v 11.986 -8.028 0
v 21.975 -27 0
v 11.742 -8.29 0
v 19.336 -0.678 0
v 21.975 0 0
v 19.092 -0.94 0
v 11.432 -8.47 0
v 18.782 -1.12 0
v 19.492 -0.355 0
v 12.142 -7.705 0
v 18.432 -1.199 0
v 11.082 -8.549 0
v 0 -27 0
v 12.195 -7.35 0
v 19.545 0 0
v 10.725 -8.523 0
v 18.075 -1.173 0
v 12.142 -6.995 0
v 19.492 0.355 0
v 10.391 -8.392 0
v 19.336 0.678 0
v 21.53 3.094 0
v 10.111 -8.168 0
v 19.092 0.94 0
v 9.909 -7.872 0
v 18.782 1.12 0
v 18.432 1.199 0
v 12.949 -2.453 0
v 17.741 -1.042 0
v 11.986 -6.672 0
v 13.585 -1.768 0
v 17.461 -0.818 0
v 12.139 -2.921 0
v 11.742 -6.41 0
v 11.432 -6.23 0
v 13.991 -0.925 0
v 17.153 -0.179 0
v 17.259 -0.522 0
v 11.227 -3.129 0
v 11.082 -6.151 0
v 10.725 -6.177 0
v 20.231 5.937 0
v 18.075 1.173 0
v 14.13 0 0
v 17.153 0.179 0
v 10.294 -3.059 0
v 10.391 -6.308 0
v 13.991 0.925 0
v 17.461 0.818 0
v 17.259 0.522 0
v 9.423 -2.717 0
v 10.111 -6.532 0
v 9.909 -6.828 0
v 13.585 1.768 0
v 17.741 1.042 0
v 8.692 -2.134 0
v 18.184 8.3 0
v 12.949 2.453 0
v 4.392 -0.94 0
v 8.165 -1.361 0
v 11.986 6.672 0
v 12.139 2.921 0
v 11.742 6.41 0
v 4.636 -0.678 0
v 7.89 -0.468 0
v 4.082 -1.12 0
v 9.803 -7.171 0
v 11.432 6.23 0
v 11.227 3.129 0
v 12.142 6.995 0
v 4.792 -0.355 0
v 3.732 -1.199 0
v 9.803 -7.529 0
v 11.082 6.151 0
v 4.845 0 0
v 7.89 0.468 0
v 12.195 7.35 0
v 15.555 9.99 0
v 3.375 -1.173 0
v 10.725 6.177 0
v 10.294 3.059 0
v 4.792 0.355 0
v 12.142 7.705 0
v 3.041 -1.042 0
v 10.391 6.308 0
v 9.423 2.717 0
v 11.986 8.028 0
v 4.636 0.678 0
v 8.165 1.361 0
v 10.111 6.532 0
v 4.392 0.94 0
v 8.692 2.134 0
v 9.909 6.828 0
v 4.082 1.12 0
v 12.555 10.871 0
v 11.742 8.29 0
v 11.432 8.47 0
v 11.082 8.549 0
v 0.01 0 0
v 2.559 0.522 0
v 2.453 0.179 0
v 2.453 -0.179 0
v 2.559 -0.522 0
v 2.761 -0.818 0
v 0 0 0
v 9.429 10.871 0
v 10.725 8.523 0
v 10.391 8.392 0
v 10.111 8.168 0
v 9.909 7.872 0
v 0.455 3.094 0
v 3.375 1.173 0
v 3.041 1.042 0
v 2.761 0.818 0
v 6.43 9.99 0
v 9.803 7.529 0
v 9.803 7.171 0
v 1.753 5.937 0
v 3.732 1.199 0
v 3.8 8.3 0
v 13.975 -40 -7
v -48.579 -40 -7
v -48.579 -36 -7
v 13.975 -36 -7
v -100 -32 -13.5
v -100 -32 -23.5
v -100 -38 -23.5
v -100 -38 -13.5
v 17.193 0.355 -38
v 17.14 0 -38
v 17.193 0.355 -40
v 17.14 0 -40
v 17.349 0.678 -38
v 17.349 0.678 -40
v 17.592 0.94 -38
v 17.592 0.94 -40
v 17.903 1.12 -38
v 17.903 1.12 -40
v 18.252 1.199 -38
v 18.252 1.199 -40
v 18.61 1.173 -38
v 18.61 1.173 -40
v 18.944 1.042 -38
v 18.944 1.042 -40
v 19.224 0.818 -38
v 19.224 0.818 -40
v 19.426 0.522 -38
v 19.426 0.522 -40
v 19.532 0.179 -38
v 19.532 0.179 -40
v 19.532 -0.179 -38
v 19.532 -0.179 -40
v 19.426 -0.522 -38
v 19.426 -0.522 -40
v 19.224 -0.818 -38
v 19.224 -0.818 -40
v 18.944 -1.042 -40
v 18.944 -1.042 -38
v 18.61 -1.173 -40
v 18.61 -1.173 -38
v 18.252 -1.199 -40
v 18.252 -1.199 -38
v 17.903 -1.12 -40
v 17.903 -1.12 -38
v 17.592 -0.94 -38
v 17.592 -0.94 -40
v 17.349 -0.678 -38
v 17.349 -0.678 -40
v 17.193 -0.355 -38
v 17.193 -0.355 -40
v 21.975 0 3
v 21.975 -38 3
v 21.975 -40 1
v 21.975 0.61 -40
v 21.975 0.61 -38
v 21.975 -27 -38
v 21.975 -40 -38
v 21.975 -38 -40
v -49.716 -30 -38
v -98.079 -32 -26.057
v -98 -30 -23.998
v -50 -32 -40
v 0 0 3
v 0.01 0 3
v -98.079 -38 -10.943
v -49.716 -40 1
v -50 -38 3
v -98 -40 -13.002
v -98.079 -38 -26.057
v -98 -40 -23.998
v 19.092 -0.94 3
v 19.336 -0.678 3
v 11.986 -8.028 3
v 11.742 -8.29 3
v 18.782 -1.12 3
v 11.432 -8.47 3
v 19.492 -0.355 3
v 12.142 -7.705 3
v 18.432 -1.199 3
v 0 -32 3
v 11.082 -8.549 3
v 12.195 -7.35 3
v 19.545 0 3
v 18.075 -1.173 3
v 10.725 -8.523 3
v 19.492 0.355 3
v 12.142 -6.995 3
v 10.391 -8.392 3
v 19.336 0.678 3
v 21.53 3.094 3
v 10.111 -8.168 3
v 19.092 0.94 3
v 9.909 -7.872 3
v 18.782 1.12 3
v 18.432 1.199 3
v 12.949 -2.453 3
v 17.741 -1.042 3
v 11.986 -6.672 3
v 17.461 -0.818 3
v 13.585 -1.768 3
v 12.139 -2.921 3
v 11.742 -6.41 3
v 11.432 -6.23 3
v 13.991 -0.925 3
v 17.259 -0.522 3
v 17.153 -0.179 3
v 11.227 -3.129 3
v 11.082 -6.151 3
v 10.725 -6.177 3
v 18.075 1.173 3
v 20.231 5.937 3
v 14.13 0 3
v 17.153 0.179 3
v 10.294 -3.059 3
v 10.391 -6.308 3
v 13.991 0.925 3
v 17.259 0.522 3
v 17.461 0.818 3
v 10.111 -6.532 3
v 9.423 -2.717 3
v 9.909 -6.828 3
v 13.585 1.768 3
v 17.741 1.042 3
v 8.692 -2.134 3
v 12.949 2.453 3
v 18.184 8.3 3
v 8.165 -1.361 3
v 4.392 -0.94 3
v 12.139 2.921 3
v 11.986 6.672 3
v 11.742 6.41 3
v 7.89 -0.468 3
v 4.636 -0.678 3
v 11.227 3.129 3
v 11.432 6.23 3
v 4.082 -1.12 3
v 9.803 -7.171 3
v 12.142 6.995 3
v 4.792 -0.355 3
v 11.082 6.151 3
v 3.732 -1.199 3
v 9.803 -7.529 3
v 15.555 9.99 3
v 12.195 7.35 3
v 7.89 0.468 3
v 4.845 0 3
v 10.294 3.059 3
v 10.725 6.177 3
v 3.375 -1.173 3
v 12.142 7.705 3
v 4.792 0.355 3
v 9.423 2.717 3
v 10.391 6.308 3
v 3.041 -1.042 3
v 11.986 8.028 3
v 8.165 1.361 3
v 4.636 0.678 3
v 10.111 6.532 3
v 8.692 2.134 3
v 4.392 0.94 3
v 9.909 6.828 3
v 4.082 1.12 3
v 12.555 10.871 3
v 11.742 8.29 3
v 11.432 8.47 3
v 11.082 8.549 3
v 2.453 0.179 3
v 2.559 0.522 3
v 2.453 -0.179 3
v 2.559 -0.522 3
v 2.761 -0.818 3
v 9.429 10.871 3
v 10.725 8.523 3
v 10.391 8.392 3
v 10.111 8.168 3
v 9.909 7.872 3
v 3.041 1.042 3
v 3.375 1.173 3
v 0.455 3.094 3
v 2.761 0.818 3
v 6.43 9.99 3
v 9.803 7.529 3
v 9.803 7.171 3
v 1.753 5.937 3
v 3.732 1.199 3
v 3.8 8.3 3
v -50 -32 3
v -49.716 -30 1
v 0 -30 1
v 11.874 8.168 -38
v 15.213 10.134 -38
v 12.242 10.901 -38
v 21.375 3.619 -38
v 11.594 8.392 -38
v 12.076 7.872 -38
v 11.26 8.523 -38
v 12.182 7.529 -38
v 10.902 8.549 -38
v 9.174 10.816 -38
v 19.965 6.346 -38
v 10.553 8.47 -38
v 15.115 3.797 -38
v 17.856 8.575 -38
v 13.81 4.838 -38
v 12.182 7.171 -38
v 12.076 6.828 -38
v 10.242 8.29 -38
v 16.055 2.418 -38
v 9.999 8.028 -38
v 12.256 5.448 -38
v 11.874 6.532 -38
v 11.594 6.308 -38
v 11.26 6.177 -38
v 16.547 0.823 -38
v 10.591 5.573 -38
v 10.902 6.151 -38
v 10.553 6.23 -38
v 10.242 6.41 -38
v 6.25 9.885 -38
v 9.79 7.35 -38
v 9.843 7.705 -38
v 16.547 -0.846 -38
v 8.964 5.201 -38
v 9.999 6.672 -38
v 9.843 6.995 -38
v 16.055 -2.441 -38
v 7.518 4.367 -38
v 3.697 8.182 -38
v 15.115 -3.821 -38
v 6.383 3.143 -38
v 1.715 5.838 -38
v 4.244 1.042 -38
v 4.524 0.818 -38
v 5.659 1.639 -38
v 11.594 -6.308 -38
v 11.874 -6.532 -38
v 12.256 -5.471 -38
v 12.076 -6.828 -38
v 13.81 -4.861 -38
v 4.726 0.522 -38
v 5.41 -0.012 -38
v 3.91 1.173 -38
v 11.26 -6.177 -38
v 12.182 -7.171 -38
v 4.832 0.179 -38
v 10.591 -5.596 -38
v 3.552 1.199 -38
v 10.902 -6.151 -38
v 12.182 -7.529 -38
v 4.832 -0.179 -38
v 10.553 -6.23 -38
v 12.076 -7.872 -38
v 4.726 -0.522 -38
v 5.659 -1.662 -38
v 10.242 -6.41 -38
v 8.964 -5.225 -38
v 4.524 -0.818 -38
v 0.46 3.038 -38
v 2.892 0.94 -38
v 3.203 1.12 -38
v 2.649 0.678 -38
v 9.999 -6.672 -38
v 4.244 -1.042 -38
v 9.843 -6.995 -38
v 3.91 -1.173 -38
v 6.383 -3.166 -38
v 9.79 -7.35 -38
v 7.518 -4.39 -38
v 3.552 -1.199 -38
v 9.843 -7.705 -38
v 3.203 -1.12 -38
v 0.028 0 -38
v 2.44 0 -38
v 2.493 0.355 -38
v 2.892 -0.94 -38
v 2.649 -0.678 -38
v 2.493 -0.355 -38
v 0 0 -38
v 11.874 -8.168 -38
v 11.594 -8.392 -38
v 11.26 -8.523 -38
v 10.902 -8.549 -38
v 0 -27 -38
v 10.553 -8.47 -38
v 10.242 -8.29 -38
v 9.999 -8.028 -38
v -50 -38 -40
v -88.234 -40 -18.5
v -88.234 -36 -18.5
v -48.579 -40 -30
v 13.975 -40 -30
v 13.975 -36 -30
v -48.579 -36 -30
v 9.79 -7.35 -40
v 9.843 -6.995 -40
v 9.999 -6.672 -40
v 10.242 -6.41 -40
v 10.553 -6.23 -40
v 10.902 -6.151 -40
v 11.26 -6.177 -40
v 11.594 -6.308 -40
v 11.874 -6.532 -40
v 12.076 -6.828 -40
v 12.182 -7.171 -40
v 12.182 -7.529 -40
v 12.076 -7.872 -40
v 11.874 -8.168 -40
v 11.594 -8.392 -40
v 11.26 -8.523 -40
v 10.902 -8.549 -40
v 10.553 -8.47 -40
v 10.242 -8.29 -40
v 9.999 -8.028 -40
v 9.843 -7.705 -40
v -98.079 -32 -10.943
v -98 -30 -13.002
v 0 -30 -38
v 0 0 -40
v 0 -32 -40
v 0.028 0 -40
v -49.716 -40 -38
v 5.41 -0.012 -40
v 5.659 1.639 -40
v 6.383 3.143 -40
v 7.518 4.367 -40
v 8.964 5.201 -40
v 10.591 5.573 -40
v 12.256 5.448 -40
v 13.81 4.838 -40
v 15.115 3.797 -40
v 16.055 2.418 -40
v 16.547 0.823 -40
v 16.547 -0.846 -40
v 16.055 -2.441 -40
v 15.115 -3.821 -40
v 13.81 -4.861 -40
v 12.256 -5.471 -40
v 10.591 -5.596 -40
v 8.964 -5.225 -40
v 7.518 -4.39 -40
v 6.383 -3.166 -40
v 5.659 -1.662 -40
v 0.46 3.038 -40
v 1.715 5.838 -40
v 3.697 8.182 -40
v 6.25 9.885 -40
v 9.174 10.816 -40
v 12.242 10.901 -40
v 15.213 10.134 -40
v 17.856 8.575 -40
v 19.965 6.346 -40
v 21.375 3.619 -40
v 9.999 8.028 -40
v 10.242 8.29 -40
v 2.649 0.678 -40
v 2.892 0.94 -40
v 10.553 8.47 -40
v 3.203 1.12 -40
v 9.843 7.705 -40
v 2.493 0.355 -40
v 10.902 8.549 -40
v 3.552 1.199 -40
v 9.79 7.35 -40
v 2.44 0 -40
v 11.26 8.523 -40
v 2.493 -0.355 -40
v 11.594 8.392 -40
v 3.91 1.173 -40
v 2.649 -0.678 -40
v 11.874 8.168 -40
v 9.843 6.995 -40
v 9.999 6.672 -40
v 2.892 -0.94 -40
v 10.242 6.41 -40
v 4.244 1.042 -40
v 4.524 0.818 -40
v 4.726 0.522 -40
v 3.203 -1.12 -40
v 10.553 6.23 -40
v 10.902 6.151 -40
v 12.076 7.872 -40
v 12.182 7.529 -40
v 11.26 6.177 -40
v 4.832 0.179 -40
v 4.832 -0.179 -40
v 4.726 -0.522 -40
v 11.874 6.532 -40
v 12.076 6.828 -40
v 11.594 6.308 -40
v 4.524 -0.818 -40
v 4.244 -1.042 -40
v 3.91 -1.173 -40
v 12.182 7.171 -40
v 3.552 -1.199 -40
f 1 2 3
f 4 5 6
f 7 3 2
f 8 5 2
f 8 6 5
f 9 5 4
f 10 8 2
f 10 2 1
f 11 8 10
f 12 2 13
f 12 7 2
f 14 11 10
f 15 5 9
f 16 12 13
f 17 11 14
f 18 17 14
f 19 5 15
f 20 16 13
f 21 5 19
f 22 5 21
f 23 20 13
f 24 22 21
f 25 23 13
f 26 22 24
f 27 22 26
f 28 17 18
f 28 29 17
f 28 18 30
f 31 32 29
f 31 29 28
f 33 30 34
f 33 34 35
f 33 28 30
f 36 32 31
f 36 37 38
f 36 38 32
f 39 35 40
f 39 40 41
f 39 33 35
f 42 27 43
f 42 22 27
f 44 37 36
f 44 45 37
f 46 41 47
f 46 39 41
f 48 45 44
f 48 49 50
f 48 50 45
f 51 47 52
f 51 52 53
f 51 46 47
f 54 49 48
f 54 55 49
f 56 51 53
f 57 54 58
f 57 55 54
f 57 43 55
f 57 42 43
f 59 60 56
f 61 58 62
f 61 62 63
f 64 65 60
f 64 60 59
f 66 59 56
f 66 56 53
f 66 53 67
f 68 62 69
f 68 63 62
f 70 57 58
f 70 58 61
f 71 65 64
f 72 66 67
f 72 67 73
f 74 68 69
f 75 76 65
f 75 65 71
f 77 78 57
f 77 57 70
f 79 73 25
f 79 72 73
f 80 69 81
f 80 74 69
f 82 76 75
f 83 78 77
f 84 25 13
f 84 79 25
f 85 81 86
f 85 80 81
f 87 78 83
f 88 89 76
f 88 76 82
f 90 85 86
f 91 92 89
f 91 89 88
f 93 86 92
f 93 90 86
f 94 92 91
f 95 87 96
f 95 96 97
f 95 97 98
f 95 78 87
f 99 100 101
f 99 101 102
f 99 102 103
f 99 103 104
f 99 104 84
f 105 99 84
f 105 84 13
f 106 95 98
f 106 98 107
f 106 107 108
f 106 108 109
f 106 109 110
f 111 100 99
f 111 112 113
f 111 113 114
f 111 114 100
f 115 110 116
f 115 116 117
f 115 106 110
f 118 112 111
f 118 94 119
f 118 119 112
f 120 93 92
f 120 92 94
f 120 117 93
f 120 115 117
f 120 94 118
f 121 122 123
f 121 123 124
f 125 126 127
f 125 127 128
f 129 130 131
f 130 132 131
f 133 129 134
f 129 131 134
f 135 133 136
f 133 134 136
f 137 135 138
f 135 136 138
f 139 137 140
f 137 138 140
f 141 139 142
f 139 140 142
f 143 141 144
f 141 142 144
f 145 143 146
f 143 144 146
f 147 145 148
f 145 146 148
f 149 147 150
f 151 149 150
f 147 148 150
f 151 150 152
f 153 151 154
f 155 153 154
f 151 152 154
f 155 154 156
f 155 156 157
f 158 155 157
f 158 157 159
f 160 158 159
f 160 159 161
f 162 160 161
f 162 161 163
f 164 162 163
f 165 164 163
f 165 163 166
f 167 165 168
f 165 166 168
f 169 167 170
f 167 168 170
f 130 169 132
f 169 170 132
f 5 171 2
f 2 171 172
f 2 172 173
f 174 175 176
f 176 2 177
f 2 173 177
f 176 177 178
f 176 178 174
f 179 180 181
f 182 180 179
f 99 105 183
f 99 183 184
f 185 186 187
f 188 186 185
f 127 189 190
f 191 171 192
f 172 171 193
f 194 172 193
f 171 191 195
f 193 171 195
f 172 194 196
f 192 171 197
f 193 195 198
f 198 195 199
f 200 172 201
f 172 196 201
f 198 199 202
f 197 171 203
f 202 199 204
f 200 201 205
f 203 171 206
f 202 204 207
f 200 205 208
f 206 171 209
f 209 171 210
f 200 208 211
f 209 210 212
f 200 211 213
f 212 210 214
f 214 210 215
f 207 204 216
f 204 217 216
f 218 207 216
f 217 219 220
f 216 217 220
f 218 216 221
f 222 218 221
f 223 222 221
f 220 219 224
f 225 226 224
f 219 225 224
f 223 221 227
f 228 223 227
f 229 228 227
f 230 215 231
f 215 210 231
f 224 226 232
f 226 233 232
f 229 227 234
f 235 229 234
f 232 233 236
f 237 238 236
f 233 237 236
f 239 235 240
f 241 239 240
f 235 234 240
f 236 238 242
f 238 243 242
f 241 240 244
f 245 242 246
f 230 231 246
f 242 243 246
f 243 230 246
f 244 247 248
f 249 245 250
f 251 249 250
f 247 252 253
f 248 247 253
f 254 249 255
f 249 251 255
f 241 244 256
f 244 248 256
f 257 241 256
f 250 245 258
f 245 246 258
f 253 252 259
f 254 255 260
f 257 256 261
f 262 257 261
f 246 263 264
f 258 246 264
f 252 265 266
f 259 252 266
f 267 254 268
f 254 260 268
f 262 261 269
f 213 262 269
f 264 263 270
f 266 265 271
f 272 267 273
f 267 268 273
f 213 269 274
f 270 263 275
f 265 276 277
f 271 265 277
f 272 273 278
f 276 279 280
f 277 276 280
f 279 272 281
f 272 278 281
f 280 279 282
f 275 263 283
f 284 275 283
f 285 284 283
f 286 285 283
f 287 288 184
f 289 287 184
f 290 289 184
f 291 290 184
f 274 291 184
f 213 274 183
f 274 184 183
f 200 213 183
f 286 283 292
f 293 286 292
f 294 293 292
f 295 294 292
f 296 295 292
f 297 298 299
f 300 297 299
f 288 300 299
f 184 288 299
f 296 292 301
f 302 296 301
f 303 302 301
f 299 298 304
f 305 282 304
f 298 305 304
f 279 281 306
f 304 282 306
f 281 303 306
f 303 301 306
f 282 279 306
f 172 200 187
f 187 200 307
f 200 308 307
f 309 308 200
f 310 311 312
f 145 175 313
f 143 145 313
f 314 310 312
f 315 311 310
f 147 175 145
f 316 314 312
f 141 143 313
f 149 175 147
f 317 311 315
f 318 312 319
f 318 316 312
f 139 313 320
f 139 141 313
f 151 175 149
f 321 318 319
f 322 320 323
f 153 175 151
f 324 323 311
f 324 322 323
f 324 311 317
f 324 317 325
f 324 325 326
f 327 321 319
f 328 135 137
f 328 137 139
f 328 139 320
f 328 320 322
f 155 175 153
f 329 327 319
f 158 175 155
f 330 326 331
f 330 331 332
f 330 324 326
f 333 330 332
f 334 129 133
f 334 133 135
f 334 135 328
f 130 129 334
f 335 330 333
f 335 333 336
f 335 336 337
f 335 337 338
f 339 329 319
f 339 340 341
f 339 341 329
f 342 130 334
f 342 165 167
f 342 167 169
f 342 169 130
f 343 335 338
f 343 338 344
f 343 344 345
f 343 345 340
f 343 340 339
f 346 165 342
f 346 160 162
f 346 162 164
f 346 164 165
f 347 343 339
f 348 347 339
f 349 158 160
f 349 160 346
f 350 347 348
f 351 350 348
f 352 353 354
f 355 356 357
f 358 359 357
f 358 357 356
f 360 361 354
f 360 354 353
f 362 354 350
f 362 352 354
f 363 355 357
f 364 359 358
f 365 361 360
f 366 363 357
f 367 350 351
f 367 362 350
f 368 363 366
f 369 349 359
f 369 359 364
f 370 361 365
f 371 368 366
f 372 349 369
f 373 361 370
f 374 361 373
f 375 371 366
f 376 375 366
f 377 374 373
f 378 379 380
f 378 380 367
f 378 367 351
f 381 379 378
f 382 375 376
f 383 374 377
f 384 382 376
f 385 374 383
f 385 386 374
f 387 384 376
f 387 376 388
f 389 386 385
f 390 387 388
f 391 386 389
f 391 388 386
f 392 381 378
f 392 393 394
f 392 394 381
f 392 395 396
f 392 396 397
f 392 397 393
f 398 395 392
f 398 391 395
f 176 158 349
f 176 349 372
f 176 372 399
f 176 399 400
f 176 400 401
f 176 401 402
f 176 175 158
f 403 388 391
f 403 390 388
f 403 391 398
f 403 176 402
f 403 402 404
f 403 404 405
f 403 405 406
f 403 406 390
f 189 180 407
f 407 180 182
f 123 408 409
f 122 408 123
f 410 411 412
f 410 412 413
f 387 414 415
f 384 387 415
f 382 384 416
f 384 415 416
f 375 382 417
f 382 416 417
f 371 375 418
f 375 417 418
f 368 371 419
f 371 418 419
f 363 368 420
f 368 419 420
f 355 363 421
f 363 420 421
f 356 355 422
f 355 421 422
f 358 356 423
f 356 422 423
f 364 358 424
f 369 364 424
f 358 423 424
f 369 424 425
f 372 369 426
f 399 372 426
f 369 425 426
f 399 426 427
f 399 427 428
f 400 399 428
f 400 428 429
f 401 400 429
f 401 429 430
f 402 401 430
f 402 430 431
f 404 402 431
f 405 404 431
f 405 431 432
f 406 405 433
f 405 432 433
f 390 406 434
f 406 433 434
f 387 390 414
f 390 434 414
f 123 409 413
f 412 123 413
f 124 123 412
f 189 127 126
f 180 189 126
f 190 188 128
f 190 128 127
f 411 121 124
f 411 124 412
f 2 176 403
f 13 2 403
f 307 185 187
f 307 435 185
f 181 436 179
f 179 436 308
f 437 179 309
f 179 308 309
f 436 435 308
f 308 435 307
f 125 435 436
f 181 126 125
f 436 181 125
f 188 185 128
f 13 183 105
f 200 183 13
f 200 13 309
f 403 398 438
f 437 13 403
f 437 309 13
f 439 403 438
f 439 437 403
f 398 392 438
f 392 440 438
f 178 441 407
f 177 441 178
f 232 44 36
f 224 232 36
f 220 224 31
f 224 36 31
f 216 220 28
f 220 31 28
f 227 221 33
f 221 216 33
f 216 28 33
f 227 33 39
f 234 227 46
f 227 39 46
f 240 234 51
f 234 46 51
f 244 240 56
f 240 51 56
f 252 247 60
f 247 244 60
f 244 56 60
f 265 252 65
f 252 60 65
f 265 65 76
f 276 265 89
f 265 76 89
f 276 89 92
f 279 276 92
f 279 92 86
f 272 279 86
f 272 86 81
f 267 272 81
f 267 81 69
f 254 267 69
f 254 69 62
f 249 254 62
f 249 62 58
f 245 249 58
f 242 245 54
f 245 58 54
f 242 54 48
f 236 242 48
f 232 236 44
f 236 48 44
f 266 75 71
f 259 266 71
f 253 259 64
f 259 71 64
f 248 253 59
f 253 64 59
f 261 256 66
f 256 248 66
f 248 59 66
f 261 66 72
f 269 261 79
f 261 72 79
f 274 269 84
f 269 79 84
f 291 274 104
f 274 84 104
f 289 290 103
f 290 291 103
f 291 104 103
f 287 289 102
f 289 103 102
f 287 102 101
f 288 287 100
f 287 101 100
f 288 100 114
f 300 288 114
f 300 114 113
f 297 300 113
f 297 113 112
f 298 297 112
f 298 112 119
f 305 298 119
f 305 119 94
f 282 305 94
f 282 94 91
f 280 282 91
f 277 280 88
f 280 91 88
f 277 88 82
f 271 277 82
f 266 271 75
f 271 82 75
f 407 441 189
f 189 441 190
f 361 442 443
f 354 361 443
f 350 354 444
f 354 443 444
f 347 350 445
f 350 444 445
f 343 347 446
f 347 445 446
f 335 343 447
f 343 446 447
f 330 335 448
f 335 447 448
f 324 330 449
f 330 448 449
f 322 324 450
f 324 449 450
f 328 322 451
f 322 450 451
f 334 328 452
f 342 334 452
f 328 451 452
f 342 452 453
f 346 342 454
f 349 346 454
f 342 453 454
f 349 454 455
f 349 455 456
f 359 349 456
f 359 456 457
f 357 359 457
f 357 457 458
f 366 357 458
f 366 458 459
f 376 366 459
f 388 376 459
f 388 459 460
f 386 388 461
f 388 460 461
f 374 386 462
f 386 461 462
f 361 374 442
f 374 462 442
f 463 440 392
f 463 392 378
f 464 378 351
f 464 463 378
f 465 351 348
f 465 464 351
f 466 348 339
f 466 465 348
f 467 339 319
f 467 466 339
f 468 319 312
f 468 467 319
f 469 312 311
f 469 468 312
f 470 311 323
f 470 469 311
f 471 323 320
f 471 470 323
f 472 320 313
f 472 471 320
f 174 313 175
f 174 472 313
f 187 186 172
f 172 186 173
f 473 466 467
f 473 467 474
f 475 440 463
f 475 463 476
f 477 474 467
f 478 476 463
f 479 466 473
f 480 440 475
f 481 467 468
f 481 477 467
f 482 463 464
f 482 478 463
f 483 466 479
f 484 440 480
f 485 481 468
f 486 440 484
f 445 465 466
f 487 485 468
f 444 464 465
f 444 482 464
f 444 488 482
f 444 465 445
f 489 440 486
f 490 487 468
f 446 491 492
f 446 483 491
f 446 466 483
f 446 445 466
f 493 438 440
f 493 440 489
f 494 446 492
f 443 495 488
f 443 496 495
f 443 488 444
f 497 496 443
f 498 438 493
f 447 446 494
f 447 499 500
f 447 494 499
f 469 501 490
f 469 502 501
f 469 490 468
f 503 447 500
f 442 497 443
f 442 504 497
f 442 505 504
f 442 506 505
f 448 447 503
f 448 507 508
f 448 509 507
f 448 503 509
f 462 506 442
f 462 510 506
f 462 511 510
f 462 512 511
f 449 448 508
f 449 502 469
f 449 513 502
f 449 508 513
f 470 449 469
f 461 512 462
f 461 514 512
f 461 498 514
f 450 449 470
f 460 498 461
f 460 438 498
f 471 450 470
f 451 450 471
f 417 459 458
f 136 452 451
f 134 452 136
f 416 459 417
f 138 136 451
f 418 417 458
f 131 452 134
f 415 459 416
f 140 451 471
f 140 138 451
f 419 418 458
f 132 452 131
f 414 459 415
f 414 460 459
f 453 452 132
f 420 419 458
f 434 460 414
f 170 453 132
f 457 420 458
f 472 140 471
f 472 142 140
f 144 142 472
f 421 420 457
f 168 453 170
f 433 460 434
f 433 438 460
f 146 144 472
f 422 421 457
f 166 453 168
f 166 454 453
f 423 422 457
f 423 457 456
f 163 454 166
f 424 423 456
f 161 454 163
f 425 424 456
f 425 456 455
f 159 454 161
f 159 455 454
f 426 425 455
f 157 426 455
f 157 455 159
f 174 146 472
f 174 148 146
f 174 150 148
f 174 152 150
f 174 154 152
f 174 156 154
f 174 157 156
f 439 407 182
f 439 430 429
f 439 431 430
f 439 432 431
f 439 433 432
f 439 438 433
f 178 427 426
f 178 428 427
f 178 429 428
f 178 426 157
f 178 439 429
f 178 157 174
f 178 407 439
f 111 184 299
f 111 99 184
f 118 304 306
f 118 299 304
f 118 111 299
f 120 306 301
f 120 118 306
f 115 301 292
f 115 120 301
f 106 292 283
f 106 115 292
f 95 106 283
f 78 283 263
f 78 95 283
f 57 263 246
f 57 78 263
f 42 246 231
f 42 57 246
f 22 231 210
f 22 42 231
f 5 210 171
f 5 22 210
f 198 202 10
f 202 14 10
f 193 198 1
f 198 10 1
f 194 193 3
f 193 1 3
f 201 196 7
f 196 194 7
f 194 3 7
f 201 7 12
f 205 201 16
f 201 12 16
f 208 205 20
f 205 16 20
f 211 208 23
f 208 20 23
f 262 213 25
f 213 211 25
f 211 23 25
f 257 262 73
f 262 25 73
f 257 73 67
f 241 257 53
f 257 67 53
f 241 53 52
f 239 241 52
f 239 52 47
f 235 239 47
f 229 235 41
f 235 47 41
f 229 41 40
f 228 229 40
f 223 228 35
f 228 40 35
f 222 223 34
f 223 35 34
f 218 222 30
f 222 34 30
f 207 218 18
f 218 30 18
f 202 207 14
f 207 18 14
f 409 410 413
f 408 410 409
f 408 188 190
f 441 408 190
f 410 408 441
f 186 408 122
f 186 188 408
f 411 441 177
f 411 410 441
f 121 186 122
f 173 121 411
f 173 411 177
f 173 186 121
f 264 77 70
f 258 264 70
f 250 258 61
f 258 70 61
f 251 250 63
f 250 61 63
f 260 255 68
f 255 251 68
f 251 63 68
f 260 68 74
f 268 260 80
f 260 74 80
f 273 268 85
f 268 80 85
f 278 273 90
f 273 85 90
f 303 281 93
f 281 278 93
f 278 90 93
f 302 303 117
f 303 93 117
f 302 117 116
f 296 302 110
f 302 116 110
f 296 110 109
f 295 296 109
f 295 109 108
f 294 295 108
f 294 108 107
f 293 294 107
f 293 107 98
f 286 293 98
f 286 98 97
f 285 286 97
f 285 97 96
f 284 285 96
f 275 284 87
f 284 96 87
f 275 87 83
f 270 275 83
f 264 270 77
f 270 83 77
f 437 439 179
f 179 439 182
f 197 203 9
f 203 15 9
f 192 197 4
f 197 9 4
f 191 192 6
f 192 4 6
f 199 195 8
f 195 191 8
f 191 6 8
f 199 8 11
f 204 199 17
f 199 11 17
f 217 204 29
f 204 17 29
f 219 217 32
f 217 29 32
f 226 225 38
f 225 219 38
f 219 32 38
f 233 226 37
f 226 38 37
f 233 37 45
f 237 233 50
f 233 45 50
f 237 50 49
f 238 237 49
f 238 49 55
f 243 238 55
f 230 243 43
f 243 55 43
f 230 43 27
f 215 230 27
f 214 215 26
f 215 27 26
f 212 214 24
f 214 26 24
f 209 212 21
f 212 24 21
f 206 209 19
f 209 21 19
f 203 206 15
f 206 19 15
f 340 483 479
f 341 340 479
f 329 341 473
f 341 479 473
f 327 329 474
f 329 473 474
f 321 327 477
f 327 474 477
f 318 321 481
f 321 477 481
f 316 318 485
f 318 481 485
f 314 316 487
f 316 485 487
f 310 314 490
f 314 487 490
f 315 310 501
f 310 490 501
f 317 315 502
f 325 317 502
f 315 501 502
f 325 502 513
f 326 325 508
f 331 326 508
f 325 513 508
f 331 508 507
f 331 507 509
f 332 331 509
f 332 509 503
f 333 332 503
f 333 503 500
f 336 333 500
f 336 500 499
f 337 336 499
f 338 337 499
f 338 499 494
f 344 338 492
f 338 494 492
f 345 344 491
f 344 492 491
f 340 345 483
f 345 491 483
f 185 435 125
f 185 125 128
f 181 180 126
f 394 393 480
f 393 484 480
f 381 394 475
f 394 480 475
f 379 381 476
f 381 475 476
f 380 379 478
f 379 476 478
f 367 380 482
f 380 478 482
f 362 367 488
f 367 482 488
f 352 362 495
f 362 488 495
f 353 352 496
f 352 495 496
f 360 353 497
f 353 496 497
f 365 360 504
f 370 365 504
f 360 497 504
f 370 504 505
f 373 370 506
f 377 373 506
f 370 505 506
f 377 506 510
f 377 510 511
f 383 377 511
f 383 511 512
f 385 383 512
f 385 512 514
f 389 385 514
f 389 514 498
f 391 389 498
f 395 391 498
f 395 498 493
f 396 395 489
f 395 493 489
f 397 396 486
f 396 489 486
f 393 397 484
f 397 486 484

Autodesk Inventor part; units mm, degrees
ref_plane "YZ Plane" through (0, 0, 0) normal (1, 0, 0) x (0, 1, 0)
ref_plane "XZ Plane" through (0, 0, 0) normal (0, 1, 0) x (-1, 0, 0)
ref_plane "XY Plane" through (0, 0, 0) normal (0, 0, 1) x (1, 0, 0)
ref_plane "Plano de trabajo1" through (0, 0, 0) normal (0, 0, 1) x (1, 0, 0)
sketch "Boceto1" plane through (0, 0, 0) normal (0, 0, 1) x (1, 0, 0)
  circle A0 centre (10.9923, 0) radius 10.9823 projected
  circle A1 centre (10.9923, 0) radius 3.1378 projected
  circle A2 centre (18.3423, 0) radius 1.2028 projected
  circle A3 centre (10.9923, 7.35) radius 1.2028 projected
  circle A4 centre (3.6423, 0) radius 1.2028 projected
  circle A5 centre (10.9923, -7.35) radius 1.2028 projected
  line L0 (0, 0) -> (0, 30)
  line L1 (21.9746, 0) -> (21.9746, -30)
  line L2 (0, 0) -> (0, -30)
  line L3 (0, -30) -> (21.9746, -30)
  circle A6 centre (10.9923, 0) radius 3.1378
  circle A7 centre (18.3423, 0) radius 1.2028
  circle A8 centre (10.9923, -7.35) radius 1.2028
  circle A9 centre (3.6423, 0) radius 1.2028
  circle A10 centre (10.9923, 7.35) radius 1.2028
  circle A11 centre (10.9923, 0) radius 10.9823
  line L4 (0, 0) -> (0, -30)
  line L5 (0, -30) -> (21.9746, -30)
  line L6 (21.9746, -30) -> (21.9746, 0)
  dimension "d0" = 30
  dimension "d1" = 30
extrude "Extrusión1" add sketch "Boceto1" along normal blind 3
sketch "Boceto2" plane through (10.9923, 0, 3) normal (0, 0, 1) x (1, 0, 0)
  circle A0 centre (0, 0) radius 10.9823 projected
  line L0 (10.9823, 0) -> (10.9823, -30)
  line L1 (10.9823, -30) -> (-9.7118, -30)
  line L2 (-9.7118, -30) -> (-10.9923, 0)
  circle A1 centre (0, 0) radius 10.9823 projected
  circle A2 centre (0, -7.35) radius 1.2028 projected
  circle A3 centre (-7.35, 0) radius 1.2028 projected
  circle A4 centre (0, 7.35) radius 1.2028 projected
  circle A5 centre (7.35, 0) radius 1.2028 projected
  circle A6 centre (0, 0) radius 3.1378 projected
  point P0 (-10.9723, -0.4683)
  dimension "d4" = 30
extrude "Extrusión2" add sketch "Boceto2" against normal blind 3 contours L0 L1 L2 A0
sketch "Boceto3" plane through (0, 0, 0) normal (0, 0, -1) x (-1, 0, 0)
  point P0 (0, 0)
sketch "Boceto4" plane through (0, 0, 3) normal (0, 0, 1) x (1, 0, 0)
  point P0 (0, 0)
sketch "Boceto5" plane through (0, 0, 0) normal (0, 0, -1) x (-1, 0, 0)
  arc A0 (-0.02, -0.4683) -> (-21.9746, 0) centre (-10.9923, 0) ccw projected
  line L0 (-21.9746, 0) -> (-21.9746, -30) projected
  line L1 (-21.9746, -30) -> (-1.2805, -30) projected
  line L2 (-1.2805, -30) -> (-0.02, -0.4683) projected
  circle A1 centre (-10.9923, -7.35) radius 1.2028 projected
  circle A2 centre (-3.6423, 0) radius 1.2028 projected
  circle A3 centre (-10.9923, 7.35) radius 1.2028 projected
  circle A4 centre (-18.3423, 0) radius 1.2028 projected
  circle A5 centre (-10.9923, 0) radius 3.1378 projected
  line L3 (-21.9746, -30) -> (0, -30)
  line L4 (0, -30) -> (0, 0)
  line L5 (0, 0) -> (-21.9746, 0)
  line L6 (-21.9746, 0) -> (-21.9746, -30)
  point P0 (-0.01, 0)
extrude "Extrusión3" add sketch "Boceto5" against normal blind 3 contours A0 L5 L4 L3 L2
sketch "Boceto6" plane through (0, 0, 0) normal (0, 0, -1) x (-1, 0, 0)
  point P0 (0, 0)
sketch "Boceto7" plane through (0, 0, 0) normal (0, 0, -1) x (-1, 0, 0)
  line L0 (-21.9746, -30) -> (0, -30) projected
  line L1 (-21.9746, -30) -> (-21.9746, 0) projected
  line L2 (0, -30) -> (-21.9746, -30)
  line L3 (-21.9746, -30) -> (-21.9746, -27)
  line L4 (-21.9746, -27) -> (0, -27)
  line L5 (0, -27) -> (0, -30)
  point P0 (0, 0)
  dimension "d9" = 3
extrude "Extrusión4" add sketch "Boceto7" along normal blind 40
sketch "Boceto8" plane through (0, -27, 0) normal (0, 1, 0) x (1, 0, 0)
  line L0 (0, -3) -> (0, 40) projected
  line L1 (21.9746, -3) -> (21.9746, 40) projected
  line L2 (0, 40) -> (21.9746, 40)
  line L3 (21.9746, 40) -> (21.9746, 38)
  line L4 (21.9746, 38) -> (0, 38)
  line L5 (0, 38) -> (0, 40)
  point P0 (0, 0)
  point P1 (21.9746, 40)
  point P2 (0, 38)
  dimension "d12" = 2
extrude "Extrusión5" add sketch "Boceto8" along normal blind 40
sketch "Boceto9" plane through (0, 0, -40) normal (0, 0, -1) x (-1, 0, 0)
  circle A0 centre (-11.0072, -0.015) radius 2.7 projected
  circle A1 centre (-11.0099, -0.0117) radius 10.9823 projected
  circle A2 centre (-18.3423, 0) radius 1.2028 projected
  circle A3 centre (-10.9923, -7.35) radius 1.2028 projected
  circle A4 centre (-10.9923, 7.35) radius 1.2028 projected
  circle A5 centre (-3.6423, 0) radius 1.2028 projected
  line L0 (-21.9746, -30) -> (-21.9746, 13) projected
  line L1 (-21.9746, -30) -> (0, -30) projected
  line L2 (0, -30) -> (0, 13) projected
  line L3 (-21.9746, 13) -> (0, 13) projected
  line L4 (-21.5706, 0) -> (-25.972, 0)
  line L5 (-25.972, 0) -> (-25.972, 18.1609)
  line L6 (-25.972, 18.1609) -> (4.5124, 18.1609)
  line L7 (4.5124, 18.1609) -> (4.5124, 1.2028)
  line L8 (4.5124, 1.2028) -> (4.5124, 0)
  line L9 (-3.6423, 0) -> (4.822, 0)
  point P0 (0, 0)
  point P1 (-21.9746, 0.6093)
  point P2 (-0.0276, 0)
  point P3 (0, 0)
extrude "Extrusión6" cut sketch "Boceto9" against normal blind 40 contours A0 | A1 L0 L3 L2 L9 | A2 | A3 | A4 | A5
sketch "Boceto10" plane through (0, -30, 3) normal (0, -1, 0) x (1, 0, 0)
  point P0 (0, -3)
sketch "Boceto11" plane through (0, -30, 3) normal (0, -1, 0) x (1, 0, 0)
  line L0 (0.0276, -43) -> (21.9746, -43) projected
  line L1 (0, -3) -> (0, 0) projected
  line L2 (21.9746, -43) -> (0, -43)
  line L3 (0, -43) -> (0, 0)
  line L4 (0, 0) -> (21.9746, 0)
  line L5 (21.9746, 0) -> (21.9746, -43)
  line L6 (0, -43) -> (-100, -43)
  line L7 (-100, -43) -> (-100, 0)
  line L8 (-100, 0) -> (0, 0)
  line L9 (0, 0) -> (0, -43)
  line L10 (-100, 0) -> (-100, -21.5)
  line L11 (-100, -21.5) -> (-100, -14.5)
  line L12 (-100, -14.5) -> (-100, -28.5)
  line L13 (-100, -28.5) -> (-50, -43)
  line L14 (-50, -43) -> (-50, 0)
  line L15 (-100, -14.5) -> (-50, 0)
  dimension "d17" = 100
  dimension "d18" = 21.5
  dimension "d19" = 7
  dimension "d20" = 14
extrude "Extrusión7" add sketch "Boceto11" along normal blind 10 contours L2 L3 L1 L4 L5 L0 | L6 L14 L8 L1 L3 | L13 L7 L15 L14
chamfer "Chaflán1" distance 2 angle 45 12 edges at (-14.0127, -40, -40) (-75, -40, -32.75) (-75, -30, -32.75) (-25, -30, -40) (-14.0127, -40, 3) (-75, -40, -4.25) (-100, -40, -18.5) (-75, -30, -4.25) (-25, -30, 3) (-100, -30, -18.5) (-100, -35, -25.5) (-100, -35, -11.5)
sketch "Boceto12" plane through (0, -40, 3) normal (0, -1, 0) x (1, 0, 0)
  line L0 (-49.7159, -2) -> (21.9746, -2) projected
  line L1 (-98, -16.0024) -> (-49.7159, -2) projected
  line L2 (-98, -26.9976) -> (-98, -16.0024) projected
  line L3 (-49.7159, -41) -> (-98, -26.9976) projected
  line L4 (21.9746, -41) -> (-49.7159, -41) projected
  line L5 (21.9746, -41) -> (21.9746, -2) projected
  line L6 (-48.5793, -33) -> (-88.2344, -21.5)
  line L7 (-88.2344, -21.5) -> (-48.5793, -10)
  line L8 (-48.5793, -10) -> (13.9746, -10)
  line L9 (13.9746, -10) -> (13.9746, -33)
  line L10 (13.9746, -33) -> (-48.5793, -33)
  point P0 (0, -3)
  dimension "d26" = 8
extrude "Extrusión8" cut sketch "Boceto12" against normal blind 4 contours L6 L7 L8 L9 L10
sketch "Boceto13" plane through (0, 0, -40) normal (0, 0, -1) x (-1, 0, 0)
  circle A0 centre (-11.0099, -0.0117) radius 5.6 projected
  circle A1 centre (-11.0072, -0.015) radius 2.7 projected
  point P0 (0, 0)
extrude "Extrusión9" cut sketch "Boceto13" against normal blind 5
properties part number "tibia"
